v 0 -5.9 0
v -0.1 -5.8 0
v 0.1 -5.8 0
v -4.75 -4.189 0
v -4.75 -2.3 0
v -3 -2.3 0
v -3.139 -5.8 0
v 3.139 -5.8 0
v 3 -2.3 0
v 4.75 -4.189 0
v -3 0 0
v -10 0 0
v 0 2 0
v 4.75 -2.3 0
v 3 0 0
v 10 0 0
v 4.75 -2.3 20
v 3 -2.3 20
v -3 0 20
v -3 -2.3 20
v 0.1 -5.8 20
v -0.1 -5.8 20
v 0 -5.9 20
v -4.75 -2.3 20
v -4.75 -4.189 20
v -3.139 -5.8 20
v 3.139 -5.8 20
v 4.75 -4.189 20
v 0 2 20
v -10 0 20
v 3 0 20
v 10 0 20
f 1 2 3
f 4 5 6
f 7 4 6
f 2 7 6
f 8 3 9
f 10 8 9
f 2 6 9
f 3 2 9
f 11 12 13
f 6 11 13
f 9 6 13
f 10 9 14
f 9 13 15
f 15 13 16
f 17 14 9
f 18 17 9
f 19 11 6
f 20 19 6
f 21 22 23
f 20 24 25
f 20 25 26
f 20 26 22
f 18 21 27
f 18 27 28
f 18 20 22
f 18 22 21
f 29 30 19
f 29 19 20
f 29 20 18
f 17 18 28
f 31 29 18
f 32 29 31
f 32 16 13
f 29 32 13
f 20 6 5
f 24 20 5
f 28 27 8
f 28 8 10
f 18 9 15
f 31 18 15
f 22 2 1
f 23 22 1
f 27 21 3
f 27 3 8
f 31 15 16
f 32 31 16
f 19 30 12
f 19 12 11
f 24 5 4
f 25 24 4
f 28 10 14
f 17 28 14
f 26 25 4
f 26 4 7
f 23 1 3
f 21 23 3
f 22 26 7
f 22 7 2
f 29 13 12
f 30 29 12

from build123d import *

# Parameters (mm, degrees)
BOSS_EXTRUDE1_DEPTH = 20


with BuildPart() as part:
    # Sketch1 → Boss-Extrude1 (new body)
    with BuildSketch(Plane.XY):
        Polygon((0, 2), (-10, 0), (-4.75, 0), (-3, 0), (0, 0), align=None)
        Polygon((0, 0), (-3, 0), (-3, -1.75), (-3, -1.8), (-3, -2.3), (-4.75, -2.3), (-4.75, -4.189339828), (-3.139339828, -5.8), (-0.1, -5.8), (0, -5.9), (0.1, -5.8), (3.139339828, -5.8), (4.75, -4.189339828), (4.75, -2.3), (3, -2.3), (3, -1.8), (3, -1.75), (3, 0), align=None)
        Polygon((10, 0), (0, 2), (0, 0), (3, 0), (4.75, 0), align=None)
    extrude(amount=BOSS_EXTRUDE1_DEPTH)


solid = part.part
